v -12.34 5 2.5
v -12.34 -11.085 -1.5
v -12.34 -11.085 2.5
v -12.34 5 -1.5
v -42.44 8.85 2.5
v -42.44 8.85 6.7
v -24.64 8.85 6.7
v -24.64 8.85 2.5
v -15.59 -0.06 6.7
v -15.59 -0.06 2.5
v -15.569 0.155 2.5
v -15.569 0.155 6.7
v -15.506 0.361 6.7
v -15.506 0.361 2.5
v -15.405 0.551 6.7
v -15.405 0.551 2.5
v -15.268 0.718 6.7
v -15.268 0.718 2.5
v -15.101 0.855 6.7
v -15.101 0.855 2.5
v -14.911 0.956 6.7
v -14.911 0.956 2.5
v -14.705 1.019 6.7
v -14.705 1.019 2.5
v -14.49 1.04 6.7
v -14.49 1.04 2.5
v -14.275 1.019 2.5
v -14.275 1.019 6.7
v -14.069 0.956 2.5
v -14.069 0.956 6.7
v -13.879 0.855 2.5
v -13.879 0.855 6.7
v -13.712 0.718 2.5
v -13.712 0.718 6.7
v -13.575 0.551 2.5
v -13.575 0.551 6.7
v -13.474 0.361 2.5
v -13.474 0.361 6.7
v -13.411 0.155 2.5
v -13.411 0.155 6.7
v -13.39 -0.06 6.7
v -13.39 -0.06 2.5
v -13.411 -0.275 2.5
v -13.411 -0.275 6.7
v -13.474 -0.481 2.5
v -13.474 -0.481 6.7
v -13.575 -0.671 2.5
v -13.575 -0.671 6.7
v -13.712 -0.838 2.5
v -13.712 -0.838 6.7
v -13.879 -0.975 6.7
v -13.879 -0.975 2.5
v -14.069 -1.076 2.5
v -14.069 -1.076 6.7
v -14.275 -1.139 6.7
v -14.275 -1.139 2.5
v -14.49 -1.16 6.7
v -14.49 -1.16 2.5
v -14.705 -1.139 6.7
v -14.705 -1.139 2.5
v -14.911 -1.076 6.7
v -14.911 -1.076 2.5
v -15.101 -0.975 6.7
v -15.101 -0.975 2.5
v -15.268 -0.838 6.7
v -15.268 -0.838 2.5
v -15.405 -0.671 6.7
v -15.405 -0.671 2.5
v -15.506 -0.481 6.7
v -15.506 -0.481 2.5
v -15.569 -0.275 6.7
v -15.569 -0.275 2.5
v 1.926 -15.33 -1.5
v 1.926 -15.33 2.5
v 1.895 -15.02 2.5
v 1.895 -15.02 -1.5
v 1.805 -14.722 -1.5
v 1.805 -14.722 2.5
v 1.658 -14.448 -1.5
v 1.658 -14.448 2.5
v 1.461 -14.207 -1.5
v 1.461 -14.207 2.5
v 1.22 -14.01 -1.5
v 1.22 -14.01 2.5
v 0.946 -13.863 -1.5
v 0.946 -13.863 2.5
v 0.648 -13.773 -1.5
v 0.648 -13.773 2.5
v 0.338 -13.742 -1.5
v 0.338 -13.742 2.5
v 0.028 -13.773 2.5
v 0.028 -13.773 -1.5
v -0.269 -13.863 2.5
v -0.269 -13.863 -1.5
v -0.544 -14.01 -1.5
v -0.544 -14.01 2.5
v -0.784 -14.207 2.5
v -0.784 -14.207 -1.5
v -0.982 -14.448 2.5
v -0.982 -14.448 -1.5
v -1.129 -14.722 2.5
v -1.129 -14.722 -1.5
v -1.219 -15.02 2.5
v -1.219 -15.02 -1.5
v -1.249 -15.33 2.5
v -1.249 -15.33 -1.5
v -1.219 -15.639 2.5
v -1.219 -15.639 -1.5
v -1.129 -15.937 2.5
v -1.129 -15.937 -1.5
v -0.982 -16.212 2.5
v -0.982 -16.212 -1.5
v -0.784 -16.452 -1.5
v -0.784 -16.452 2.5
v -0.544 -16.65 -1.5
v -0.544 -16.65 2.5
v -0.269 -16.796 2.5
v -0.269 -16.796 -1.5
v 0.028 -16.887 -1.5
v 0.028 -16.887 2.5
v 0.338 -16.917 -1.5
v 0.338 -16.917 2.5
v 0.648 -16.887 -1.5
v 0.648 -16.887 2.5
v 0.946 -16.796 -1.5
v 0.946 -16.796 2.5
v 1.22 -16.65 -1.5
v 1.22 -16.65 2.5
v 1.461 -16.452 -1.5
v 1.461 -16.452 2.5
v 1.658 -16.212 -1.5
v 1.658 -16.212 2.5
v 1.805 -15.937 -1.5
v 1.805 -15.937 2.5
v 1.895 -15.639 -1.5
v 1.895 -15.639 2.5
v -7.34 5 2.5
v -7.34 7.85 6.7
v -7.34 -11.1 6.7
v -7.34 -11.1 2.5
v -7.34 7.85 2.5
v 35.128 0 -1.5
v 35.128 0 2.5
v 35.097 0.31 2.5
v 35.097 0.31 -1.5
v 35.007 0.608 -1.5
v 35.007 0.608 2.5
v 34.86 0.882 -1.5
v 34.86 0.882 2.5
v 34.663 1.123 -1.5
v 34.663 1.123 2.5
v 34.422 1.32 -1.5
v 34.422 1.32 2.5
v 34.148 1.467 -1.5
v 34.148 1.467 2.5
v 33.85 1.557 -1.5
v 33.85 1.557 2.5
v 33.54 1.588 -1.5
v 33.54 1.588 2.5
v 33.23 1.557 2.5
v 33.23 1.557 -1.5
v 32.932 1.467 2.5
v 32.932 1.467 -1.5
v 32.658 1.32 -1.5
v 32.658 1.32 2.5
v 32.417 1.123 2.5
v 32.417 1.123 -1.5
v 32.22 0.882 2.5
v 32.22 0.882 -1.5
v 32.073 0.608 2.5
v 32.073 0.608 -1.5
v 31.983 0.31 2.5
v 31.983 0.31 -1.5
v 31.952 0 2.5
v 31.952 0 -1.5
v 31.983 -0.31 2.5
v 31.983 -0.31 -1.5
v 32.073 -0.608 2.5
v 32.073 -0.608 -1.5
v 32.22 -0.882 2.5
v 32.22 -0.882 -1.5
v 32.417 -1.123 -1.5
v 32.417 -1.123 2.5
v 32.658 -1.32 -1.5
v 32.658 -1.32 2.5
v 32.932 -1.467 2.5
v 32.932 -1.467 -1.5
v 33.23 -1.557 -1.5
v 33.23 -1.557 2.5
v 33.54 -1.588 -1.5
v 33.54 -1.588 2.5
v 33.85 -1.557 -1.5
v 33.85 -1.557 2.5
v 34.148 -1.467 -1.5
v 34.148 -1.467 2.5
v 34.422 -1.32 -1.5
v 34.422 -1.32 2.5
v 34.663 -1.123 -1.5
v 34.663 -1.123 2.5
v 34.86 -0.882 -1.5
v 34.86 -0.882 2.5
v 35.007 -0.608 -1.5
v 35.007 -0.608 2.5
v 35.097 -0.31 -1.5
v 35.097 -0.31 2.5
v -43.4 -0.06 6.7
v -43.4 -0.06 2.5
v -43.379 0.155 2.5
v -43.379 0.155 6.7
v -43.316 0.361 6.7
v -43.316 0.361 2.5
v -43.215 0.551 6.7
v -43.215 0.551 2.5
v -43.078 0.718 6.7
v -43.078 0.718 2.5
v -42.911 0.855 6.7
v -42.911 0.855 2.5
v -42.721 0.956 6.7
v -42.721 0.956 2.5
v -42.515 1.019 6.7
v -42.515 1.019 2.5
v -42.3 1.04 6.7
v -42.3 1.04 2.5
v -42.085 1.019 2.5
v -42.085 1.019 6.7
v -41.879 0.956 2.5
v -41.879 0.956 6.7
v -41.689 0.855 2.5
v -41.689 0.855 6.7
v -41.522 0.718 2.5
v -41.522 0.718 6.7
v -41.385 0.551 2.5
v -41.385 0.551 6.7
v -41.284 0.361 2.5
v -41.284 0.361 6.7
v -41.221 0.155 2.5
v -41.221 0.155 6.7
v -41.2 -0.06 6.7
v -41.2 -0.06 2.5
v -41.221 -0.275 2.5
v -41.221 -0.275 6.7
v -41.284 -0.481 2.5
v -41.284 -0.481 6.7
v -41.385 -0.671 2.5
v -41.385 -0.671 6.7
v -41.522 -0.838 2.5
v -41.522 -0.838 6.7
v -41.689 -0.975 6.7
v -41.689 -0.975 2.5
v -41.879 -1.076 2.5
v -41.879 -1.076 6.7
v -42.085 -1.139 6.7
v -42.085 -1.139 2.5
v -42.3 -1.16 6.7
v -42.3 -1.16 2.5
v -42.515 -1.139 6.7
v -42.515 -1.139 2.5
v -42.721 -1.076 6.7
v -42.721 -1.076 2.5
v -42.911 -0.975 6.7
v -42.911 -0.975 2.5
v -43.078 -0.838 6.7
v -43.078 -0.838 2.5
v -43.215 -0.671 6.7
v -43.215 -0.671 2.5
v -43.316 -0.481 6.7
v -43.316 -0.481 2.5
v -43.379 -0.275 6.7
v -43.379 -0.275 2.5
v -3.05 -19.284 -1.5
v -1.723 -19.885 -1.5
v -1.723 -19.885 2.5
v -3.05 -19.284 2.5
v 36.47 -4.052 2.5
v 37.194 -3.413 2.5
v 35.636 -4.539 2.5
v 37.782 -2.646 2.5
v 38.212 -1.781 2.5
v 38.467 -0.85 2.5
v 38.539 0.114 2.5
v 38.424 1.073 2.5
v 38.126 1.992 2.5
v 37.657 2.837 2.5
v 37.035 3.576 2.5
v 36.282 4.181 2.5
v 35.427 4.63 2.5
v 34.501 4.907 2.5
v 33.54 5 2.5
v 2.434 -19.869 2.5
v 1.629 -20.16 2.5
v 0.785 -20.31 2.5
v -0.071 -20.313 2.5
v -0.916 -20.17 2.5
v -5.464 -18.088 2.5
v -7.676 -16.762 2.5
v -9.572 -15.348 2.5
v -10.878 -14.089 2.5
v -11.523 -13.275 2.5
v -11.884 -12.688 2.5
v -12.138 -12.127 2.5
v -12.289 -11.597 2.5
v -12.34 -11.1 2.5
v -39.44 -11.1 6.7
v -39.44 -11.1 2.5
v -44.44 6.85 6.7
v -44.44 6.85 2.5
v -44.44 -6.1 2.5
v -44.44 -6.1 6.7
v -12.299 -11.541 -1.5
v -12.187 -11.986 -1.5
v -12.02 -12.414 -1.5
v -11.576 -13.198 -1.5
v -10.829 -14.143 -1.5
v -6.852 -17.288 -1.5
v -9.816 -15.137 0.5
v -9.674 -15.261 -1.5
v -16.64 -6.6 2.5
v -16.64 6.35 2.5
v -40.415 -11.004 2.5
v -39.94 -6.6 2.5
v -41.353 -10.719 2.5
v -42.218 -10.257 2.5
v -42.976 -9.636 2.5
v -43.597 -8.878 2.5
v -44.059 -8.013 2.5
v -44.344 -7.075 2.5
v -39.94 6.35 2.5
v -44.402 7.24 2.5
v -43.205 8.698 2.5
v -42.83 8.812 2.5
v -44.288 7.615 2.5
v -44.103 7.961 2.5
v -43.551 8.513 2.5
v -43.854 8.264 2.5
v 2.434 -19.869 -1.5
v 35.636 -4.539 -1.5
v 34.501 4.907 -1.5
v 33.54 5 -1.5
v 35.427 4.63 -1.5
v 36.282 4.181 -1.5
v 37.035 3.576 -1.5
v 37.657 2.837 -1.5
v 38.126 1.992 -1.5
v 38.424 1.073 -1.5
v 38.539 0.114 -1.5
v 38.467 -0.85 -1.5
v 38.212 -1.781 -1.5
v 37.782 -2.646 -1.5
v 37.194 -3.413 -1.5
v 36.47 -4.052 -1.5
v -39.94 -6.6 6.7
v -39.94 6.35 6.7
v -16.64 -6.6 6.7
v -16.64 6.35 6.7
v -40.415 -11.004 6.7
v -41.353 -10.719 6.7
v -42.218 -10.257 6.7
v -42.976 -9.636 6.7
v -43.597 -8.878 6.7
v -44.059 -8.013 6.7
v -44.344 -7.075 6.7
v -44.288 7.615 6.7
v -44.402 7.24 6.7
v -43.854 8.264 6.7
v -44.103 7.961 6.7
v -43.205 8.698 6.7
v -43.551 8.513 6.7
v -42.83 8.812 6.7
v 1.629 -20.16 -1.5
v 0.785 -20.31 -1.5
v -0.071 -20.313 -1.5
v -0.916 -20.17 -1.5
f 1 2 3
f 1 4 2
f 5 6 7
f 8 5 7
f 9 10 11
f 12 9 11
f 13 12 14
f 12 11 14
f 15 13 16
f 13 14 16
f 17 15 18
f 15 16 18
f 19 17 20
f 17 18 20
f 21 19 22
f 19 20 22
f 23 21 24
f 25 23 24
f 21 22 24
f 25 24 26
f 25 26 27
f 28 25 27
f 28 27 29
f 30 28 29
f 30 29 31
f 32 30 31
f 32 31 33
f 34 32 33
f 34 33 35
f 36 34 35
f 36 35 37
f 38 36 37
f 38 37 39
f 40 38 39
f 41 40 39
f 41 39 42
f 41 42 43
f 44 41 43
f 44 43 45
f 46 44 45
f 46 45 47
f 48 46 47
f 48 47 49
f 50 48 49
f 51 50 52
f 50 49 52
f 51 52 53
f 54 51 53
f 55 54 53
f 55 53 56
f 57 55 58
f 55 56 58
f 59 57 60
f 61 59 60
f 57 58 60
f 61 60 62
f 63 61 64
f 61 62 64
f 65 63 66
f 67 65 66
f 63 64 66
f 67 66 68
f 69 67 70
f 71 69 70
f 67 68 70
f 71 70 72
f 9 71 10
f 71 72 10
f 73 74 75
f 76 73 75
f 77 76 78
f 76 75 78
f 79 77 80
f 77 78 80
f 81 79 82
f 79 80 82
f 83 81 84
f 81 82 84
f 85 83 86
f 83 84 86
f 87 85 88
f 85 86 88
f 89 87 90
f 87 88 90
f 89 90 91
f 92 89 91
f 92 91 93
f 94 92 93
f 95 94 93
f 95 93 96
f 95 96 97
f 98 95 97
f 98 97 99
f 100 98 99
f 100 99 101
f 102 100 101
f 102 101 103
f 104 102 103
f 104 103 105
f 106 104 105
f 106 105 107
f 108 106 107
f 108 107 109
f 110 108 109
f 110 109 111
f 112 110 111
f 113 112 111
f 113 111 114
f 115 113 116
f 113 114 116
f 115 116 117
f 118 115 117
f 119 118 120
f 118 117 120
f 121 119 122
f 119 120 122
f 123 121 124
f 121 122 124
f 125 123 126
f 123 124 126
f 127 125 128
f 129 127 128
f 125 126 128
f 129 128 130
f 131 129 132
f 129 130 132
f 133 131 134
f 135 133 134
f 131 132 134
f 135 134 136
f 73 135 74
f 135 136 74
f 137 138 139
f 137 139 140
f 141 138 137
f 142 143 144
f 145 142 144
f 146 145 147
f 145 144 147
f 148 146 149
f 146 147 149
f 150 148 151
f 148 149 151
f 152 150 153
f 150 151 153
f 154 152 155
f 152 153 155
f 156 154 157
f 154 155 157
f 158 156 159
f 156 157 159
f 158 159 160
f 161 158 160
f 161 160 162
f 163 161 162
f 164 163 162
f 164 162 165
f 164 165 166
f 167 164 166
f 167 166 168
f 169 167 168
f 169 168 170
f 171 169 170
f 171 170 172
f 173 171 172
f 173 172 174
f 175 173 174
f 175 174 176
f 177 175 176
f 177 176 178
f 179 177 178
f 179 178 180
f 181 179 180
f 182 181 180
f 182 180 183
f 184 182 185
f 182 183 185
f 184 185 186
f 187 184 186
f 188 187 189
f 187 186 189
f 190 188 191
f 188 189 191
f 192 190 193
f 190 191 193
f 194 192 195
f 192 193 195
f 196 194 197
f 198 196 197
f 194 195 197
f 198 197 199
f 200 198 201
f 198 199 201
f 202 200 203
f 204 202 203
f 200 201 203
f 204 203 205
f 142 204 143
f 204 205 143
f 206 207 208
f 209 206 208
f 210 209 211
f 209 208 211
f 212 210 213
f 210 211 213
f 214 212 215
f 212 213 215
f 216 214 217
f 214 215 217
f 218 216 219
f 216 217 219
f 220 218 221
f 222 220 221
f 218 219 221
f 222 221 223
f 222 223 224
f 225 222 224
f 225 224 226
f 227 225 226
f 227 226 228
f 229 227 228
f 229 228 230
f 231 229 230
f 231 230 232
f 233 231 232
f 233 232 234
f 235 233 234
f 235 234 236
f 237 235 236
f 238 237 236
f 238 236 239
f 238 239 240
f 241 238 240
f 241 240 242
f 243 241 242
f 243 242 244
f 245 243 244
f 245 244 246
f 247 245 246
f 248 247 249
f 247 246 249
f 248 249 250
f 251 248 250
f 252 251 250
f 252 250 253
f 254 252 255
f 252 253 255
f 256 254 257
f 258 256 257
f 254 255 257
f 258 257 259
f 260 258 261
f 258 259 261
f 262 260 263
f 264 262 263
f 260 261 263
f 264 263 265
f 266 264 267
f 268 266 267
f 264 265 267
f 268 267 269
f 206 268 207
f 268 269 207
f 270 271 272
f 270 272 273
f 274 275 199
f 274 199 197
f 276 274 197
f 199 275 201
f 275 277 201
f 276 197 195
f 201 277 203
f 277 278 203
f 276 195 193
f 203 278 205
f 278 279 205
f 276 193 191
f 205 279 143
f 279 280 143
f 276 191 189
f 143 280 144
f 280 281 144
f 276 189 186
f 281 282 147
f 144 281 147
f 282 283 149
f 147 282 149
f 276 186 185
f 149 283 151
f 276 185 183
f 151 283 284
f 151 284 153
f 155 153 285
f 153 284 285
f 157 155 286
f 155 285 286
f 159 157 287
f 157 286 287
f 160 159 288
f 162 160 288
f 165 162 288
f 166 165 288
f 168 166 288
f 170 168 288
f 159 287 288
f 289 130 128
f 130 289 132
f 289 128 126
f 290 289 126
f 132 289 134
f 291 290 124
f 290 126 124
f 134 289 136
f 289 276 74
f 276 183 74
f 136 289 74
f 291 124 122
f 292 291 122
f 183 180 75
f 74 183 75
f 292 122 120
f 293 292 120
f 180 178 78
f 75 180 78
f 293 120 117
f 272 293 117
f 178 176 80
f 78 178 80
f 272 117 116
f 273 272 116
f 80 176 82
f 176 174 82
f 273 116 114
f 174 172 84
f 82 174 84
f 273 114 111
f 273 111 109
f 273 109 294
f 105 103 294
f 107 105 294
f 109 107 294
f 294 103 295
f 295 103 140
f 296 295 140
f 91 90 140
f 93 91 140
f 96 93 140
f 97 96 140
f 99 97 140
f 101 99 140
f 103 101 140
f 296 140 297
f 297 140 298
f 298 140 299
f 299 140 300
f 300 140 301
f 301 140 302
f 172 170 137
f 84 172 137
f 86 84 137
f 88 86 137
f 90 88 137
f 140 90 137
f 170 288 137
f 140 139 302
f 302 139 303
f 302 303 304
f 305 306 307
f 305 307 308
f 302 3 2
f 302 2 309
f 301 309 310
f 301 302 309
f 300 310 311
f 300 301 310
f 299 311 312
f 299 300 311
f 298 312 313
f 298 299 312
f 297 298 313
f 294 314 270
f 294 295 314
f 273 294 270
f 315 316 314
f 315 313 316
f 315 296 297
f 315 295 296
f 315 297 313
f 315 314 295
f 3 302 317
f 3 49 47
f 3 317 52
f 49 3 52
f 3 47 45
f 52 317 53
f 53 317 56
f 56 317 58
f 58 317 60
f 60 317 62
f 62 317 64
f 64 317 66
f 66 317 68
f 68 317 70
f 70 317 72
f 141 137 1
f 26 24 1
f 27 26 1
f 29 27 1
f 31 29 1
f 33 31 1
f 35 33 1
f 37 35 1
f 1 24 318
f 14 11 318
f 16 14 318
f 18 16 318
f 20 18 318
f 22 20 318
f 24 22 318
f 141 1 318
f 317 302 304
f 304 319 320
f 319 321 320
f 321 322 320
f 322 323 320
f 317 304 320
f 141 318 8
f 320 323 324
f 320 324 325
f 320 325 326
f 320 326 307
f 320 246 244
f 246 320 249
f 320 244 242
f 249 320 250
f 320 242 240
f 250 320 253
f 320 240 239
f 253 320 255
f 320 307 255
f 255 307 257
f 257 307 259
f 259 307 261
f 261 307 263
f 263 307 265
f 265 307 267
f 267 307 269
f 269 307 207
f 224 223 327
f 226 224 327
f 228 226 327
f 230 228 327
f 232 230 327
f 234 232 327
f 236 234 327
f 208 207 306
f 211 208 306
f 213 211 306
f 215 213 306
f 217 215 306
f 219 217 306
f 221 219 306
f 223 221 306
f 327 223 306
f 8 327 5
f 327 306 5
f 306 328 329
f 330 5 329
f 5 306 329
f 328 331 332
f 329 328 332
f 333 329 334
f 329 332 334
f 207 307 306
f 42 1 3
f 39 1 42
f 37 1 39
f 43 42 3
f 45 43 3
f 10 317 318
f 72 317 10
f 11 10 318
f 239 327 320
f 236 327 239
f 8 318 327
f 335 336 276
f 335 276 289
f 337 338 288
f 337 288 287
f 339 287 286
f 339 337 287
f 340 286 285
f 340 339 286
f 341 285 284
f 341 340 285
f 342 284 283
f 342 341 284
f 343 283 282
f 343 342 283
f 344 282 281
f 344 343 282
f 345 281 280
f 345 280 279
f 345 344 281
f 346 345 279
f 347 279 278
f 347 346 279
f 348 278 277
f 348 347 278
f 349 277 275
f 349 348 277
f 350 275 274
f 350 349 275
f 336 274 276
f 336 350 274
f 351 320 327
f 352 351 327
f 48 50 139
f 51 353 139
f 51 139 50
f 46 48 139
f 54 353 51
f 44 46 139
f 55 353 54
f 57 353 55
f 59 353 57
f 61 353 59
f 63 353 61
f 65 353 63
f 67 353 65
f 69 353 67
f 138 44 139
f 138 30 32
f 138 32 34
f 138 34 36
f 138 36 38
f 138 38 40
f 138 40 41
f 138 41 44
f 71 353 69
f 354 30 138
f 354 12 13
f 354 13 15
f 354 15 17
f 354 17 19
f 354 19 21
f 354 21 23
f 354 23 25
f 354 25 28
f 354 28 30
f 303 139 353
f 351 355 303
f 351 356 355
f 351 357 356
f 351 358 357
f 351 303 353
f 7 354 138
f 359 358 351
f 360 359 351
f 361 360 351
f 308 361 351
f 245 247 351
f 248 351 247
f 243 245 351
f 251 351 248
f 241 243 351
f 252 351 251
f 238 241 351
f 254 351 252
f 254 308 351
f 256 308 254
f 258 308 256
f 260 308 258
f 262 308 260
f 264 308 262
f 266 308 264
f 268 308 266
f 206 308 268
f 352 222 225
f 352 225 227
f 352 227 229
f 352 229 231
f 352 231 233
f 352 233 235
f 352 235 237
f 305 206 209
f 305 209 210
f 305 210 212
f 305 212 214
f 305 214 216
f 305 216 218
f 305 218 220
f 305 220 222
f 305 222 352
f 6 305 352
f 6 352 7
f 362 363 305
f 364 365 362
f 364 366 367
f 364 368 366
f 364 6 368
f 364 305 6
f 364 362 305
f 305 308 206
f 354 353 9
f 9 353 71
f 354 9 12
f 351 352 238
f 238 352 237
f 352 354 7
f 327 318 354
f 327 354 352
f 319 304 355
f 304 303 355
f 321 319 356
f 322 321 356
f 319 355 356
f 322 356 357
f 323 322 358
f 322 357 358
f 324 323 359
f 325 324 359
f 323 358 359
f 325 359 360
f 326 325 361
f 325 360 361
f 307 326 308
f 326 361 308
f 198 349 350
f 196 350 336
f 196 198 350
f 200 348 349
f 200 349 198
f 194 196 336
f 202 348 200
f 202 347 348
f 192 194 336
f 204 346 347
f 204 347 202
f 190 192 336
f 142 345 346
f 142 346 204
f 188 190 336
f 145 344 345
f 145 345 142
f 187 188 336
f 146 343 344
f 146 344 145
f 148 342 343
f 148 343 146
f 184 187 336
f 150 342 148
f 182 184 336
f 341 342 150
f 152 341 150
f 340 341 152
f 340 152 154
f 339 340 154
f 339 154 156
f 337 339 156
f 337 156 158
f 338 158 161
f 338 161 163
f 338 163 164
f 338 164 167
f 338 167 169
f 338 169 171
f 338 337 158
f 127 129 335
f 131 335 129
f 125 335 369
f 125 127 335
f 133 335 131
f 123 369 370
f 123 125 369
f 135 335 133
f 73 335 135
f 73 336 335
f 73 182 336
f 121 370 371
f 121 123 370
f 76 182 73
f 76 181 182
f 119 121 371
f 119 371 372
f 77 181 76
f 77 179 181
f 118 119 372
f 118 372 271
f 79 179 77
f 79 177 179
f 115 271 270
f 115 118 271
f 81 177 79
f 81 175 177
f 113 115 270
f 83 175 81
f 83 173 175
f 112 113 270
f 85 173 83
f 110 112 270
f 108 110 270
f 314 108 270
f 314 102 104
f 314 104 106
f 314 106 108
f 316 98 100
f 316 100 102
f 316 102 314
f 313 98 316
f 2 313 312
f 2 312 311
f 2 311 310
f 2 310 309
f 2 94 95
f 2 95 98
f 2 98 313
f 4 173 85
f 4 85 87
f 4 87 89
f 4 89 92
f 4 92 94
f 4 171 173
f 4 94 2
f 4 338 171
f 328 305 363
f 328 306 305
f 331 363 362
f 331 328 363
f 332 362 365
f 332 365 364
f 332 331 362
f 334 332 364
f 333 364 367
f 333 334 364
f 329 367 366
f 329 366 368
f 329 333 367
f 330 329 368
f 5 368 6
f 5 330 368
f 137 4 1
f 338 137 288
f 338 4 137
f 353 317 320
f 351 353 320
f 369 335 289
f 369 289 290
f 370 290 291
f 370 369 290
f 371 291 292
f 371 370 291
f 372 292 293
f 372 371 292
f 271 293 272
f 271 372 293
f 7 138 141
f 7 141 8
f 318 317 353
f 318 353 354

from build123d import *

# Parameters (mm, degrees)
BOSS_EXTRUDE1_DEPTH      = 2.5
BOSS_EXTRUDE1_DEPTH_BACK = 1.5
SKETCH2_R                = 1.5875
CUT_EXTRUDE1_DEPTH       = 44.756449915
CUT_EXTRUDE3_DEPTH       = 59.296841331
SKETCH4_W                = 4.2
SKETCH4_H                = 22.2
BOSS_EXTRUDE2_DEPTH      = 32.1
SKETCH6_W                = 23.3
SKETCH6_H                = 12.95
CUT_EXTRUDE4_DEPTH       = 4.2
SKETCH7_W                = 4.2
SKETCH7_H                = 22.2
BOSS_EXTRUDE3_DEPTH      = 5
CUT_EXTRUDE5_DEPTH       = 3.7
FILLET1_R                = 5
F_2_0MM_DOWEL_HOLE1_D    = 2.2
SKETCH12_W               = 37.1
SKETCH12_H               = 2.25
CUT_EXTRUDE6_DEPTH       = 4.2
FILLET3_R                = 2
CUT_EXTRUDE7_REACH       = 51.552


with BuildPart() as part:
    # Sketch1 → Boss-Extrude1 (new, two sides: drawn at the far end of the back side and taken through both)
    with BuildSketch(Plane.XY.offset(-BOSS_EXTRUDE1_DEPTH_BACK)):
        with BuildLine():
            Line((-33.54, 5), (33.54, 5))
            ThreePointArc((33.54, 5), (38.423518139, 1.072963462), (35.635934611, -4.539499764))
            Line((35.635934611, -4.539499764), (2.434033336, -19.869165506))
            ThreePointArc((2.434033336, -19.869165506), (0.357155817, -20.329629424), (-1.723171376, -19.885010467))
            Line((-1.723171376, -19.885010467), (-35.601270101, -4.555344726))
            ThreePointArc((-35.601270101, -4.555344726), (-38.42757218, 1.054342537), (-33.54, 5))
        make_face()
    extrude(amount=BOSS_EXTRUDE1_DEPTH + BOSS_EXTRUDE1_DEPTH_BACK)

    # Sketch2 → Cut-Extrude1 (cut, through all)
    with BuildSketch(Plane.XY.offset(2.5)):
        with Locations((-33.54, 0)):
            Circle(SKETCH2_R)
        with Locations((33.54, 0)):
            Circle(SKETCH2_R)
        with Locations((0.338098725, -15.329665742)):
            Circle(SKETCH2_R)
    extrude(amount=-CUT_EXTRUDE1_DEPTH, mode=Mode.SUBTRACT)

    # Sketch3 → Cut-Extrude3 (cut, through all)
    with BuildSketch(Plane.ZY.offset(16.04)):
        Polygon((-1.5, -4.555344726), (-1.5, -19.885010467), (2.5, -19.885010467), (2.5, -4.555344726), (2.5, 5), (-1.5, 5), align=None)
    extrude(amount=CUT_EXTRUDE3_DEPTH, mode=Mode.SUBTRACT)

    # Sketch4 → Boss-Extrude2 (add)
    with BuildSketch(Plane.ZY.offset(12.34)):
        with Locations((4.6, 0)):
            Rectangle(SKETCH4_W, SKETCH4_H)
    extrude(amount=BOSS_EXTRUDE2_DEPTH)

    # Sketch6 → Cut-Extrude4 (cut)
    with BuildSketch(Plane(origin=(0, 0, 2.5), x_dir=(-1, 0, 0), z_dir=(0, 0, -1))):
        with Locations((28.29, -0.125)):
            Rectangle(SKETCH6_W, SKETCH6_H)
    extrude(amount=-CUT_EXTRUDE4_DEPTH, mode=Mode.SUBTRACT)

    # Sketch7 → Boss-Extrude3 (add)
    with BuildSketch(Plane(origin=(-12.34, 0, 0), x_dir=(0, 0, -1), z_dir=(1, 0, 0))):
        with Locations((-4.6, 0)):
            Rectangle(SKETCH7_W, SKETCH7_H)
    extrude(amount=BOSS_EXTRUDE3_DEPTH)

    # Sketch8 → Cut-Extrude5 (cut)
    with BuildSketch(Plane.ZY.offset(12.34)):
        Polygon((2.5, -13.406719018), (2.5, -11.1), (2.5, 5), (-1.5, 5), (-1.5, -13.406719018), (-1.5, -19.885010467), (2.5, -19.885010467), align=None)
    extrude(amount=CUT_EXTRUDE5_DEPTH, mode=Mode.SUBTRACT)

    # Fillet1
    fillet1_edges = [part.edges().sort_by_distance(p)[0] for p in [
        (-44.44, -11.1, 4.6),
    ]]
    fillet(fillet1_edges, radius=FILLET1_R)

    # Fillet2
    # a fillet whose section is not a circle: 13, 9 mm, written as the material it takes off along each edge
    with BuildSketch(Plane(origin=(-12.34, -15.080950022, 2.5), x_dir=(0, 1, 0), z_dir=(0, 0, -1))) as fillet2_piece_1:
        with BuildLine():
            Bezier((3.996072697, 0), (0, 0), (-4.203547809, 9.289713818), weights=[1, 0.840313638, 1])
            Line((-4.203547809, 9.289713818), (0, 0))
            Line((0, 0), (3.996072697, 0))
        make_face()
    extrude(amount=29.491248131, mode=Mode.SUBTRACT)

    # Ø2.0mm Dowel Hole1 (through all)
    with Locations(Plane.XY.offset(6.7)):
        with Locations((-42.3, -0.06), (-14.49, -0.06)):
            Hole(F_2_0MM_DOWEL_HOLE1_D / 2)

    # Sketch12 → Cut-Extrude6 (cut)
    with BuildSketch(Plane.XY.offset(6.7)):
        with Locations((-25.89, 9.975)):
            Rectangle(SKETCH12_W, SKETCH12_H)
    extrude(amount=-CUT_EXTRUDE6_DEPTH, mode=Mode.SUBTRACT)

    # Fillet3
    fillet3_edges = [part.edges().sort_by_distance(p)[0] for p in [
        (-44.44, 8.85, 4.6),
    ]]
    fillet(fillet3_edges, radius=FILLET3_R)

    # Sketch13 → Cut-Extrude7 (cut, up to next)
    with BuildSketch(Plane.XY.offset(6.7), mode=Mode.PRIVATE) as cut_extrude7_sk1:
        Polygon((-7.34, 8.85), (-7.34, 7.85), (-24.64, 8.85), align=None)
    cut_extrude7_tool1 = extrude(cut_extrude7_sk1.sketch, amount=-CUT_EXTRUDE7_REACH, mode=Mode.PRIVATE) & part.part
    add(cut_extrude7_tool1.solids().sort_by_distance((-13.106667, 8.516667, 6.7))[0], mode=Mode.SUBTRACT)


solid = part.part
